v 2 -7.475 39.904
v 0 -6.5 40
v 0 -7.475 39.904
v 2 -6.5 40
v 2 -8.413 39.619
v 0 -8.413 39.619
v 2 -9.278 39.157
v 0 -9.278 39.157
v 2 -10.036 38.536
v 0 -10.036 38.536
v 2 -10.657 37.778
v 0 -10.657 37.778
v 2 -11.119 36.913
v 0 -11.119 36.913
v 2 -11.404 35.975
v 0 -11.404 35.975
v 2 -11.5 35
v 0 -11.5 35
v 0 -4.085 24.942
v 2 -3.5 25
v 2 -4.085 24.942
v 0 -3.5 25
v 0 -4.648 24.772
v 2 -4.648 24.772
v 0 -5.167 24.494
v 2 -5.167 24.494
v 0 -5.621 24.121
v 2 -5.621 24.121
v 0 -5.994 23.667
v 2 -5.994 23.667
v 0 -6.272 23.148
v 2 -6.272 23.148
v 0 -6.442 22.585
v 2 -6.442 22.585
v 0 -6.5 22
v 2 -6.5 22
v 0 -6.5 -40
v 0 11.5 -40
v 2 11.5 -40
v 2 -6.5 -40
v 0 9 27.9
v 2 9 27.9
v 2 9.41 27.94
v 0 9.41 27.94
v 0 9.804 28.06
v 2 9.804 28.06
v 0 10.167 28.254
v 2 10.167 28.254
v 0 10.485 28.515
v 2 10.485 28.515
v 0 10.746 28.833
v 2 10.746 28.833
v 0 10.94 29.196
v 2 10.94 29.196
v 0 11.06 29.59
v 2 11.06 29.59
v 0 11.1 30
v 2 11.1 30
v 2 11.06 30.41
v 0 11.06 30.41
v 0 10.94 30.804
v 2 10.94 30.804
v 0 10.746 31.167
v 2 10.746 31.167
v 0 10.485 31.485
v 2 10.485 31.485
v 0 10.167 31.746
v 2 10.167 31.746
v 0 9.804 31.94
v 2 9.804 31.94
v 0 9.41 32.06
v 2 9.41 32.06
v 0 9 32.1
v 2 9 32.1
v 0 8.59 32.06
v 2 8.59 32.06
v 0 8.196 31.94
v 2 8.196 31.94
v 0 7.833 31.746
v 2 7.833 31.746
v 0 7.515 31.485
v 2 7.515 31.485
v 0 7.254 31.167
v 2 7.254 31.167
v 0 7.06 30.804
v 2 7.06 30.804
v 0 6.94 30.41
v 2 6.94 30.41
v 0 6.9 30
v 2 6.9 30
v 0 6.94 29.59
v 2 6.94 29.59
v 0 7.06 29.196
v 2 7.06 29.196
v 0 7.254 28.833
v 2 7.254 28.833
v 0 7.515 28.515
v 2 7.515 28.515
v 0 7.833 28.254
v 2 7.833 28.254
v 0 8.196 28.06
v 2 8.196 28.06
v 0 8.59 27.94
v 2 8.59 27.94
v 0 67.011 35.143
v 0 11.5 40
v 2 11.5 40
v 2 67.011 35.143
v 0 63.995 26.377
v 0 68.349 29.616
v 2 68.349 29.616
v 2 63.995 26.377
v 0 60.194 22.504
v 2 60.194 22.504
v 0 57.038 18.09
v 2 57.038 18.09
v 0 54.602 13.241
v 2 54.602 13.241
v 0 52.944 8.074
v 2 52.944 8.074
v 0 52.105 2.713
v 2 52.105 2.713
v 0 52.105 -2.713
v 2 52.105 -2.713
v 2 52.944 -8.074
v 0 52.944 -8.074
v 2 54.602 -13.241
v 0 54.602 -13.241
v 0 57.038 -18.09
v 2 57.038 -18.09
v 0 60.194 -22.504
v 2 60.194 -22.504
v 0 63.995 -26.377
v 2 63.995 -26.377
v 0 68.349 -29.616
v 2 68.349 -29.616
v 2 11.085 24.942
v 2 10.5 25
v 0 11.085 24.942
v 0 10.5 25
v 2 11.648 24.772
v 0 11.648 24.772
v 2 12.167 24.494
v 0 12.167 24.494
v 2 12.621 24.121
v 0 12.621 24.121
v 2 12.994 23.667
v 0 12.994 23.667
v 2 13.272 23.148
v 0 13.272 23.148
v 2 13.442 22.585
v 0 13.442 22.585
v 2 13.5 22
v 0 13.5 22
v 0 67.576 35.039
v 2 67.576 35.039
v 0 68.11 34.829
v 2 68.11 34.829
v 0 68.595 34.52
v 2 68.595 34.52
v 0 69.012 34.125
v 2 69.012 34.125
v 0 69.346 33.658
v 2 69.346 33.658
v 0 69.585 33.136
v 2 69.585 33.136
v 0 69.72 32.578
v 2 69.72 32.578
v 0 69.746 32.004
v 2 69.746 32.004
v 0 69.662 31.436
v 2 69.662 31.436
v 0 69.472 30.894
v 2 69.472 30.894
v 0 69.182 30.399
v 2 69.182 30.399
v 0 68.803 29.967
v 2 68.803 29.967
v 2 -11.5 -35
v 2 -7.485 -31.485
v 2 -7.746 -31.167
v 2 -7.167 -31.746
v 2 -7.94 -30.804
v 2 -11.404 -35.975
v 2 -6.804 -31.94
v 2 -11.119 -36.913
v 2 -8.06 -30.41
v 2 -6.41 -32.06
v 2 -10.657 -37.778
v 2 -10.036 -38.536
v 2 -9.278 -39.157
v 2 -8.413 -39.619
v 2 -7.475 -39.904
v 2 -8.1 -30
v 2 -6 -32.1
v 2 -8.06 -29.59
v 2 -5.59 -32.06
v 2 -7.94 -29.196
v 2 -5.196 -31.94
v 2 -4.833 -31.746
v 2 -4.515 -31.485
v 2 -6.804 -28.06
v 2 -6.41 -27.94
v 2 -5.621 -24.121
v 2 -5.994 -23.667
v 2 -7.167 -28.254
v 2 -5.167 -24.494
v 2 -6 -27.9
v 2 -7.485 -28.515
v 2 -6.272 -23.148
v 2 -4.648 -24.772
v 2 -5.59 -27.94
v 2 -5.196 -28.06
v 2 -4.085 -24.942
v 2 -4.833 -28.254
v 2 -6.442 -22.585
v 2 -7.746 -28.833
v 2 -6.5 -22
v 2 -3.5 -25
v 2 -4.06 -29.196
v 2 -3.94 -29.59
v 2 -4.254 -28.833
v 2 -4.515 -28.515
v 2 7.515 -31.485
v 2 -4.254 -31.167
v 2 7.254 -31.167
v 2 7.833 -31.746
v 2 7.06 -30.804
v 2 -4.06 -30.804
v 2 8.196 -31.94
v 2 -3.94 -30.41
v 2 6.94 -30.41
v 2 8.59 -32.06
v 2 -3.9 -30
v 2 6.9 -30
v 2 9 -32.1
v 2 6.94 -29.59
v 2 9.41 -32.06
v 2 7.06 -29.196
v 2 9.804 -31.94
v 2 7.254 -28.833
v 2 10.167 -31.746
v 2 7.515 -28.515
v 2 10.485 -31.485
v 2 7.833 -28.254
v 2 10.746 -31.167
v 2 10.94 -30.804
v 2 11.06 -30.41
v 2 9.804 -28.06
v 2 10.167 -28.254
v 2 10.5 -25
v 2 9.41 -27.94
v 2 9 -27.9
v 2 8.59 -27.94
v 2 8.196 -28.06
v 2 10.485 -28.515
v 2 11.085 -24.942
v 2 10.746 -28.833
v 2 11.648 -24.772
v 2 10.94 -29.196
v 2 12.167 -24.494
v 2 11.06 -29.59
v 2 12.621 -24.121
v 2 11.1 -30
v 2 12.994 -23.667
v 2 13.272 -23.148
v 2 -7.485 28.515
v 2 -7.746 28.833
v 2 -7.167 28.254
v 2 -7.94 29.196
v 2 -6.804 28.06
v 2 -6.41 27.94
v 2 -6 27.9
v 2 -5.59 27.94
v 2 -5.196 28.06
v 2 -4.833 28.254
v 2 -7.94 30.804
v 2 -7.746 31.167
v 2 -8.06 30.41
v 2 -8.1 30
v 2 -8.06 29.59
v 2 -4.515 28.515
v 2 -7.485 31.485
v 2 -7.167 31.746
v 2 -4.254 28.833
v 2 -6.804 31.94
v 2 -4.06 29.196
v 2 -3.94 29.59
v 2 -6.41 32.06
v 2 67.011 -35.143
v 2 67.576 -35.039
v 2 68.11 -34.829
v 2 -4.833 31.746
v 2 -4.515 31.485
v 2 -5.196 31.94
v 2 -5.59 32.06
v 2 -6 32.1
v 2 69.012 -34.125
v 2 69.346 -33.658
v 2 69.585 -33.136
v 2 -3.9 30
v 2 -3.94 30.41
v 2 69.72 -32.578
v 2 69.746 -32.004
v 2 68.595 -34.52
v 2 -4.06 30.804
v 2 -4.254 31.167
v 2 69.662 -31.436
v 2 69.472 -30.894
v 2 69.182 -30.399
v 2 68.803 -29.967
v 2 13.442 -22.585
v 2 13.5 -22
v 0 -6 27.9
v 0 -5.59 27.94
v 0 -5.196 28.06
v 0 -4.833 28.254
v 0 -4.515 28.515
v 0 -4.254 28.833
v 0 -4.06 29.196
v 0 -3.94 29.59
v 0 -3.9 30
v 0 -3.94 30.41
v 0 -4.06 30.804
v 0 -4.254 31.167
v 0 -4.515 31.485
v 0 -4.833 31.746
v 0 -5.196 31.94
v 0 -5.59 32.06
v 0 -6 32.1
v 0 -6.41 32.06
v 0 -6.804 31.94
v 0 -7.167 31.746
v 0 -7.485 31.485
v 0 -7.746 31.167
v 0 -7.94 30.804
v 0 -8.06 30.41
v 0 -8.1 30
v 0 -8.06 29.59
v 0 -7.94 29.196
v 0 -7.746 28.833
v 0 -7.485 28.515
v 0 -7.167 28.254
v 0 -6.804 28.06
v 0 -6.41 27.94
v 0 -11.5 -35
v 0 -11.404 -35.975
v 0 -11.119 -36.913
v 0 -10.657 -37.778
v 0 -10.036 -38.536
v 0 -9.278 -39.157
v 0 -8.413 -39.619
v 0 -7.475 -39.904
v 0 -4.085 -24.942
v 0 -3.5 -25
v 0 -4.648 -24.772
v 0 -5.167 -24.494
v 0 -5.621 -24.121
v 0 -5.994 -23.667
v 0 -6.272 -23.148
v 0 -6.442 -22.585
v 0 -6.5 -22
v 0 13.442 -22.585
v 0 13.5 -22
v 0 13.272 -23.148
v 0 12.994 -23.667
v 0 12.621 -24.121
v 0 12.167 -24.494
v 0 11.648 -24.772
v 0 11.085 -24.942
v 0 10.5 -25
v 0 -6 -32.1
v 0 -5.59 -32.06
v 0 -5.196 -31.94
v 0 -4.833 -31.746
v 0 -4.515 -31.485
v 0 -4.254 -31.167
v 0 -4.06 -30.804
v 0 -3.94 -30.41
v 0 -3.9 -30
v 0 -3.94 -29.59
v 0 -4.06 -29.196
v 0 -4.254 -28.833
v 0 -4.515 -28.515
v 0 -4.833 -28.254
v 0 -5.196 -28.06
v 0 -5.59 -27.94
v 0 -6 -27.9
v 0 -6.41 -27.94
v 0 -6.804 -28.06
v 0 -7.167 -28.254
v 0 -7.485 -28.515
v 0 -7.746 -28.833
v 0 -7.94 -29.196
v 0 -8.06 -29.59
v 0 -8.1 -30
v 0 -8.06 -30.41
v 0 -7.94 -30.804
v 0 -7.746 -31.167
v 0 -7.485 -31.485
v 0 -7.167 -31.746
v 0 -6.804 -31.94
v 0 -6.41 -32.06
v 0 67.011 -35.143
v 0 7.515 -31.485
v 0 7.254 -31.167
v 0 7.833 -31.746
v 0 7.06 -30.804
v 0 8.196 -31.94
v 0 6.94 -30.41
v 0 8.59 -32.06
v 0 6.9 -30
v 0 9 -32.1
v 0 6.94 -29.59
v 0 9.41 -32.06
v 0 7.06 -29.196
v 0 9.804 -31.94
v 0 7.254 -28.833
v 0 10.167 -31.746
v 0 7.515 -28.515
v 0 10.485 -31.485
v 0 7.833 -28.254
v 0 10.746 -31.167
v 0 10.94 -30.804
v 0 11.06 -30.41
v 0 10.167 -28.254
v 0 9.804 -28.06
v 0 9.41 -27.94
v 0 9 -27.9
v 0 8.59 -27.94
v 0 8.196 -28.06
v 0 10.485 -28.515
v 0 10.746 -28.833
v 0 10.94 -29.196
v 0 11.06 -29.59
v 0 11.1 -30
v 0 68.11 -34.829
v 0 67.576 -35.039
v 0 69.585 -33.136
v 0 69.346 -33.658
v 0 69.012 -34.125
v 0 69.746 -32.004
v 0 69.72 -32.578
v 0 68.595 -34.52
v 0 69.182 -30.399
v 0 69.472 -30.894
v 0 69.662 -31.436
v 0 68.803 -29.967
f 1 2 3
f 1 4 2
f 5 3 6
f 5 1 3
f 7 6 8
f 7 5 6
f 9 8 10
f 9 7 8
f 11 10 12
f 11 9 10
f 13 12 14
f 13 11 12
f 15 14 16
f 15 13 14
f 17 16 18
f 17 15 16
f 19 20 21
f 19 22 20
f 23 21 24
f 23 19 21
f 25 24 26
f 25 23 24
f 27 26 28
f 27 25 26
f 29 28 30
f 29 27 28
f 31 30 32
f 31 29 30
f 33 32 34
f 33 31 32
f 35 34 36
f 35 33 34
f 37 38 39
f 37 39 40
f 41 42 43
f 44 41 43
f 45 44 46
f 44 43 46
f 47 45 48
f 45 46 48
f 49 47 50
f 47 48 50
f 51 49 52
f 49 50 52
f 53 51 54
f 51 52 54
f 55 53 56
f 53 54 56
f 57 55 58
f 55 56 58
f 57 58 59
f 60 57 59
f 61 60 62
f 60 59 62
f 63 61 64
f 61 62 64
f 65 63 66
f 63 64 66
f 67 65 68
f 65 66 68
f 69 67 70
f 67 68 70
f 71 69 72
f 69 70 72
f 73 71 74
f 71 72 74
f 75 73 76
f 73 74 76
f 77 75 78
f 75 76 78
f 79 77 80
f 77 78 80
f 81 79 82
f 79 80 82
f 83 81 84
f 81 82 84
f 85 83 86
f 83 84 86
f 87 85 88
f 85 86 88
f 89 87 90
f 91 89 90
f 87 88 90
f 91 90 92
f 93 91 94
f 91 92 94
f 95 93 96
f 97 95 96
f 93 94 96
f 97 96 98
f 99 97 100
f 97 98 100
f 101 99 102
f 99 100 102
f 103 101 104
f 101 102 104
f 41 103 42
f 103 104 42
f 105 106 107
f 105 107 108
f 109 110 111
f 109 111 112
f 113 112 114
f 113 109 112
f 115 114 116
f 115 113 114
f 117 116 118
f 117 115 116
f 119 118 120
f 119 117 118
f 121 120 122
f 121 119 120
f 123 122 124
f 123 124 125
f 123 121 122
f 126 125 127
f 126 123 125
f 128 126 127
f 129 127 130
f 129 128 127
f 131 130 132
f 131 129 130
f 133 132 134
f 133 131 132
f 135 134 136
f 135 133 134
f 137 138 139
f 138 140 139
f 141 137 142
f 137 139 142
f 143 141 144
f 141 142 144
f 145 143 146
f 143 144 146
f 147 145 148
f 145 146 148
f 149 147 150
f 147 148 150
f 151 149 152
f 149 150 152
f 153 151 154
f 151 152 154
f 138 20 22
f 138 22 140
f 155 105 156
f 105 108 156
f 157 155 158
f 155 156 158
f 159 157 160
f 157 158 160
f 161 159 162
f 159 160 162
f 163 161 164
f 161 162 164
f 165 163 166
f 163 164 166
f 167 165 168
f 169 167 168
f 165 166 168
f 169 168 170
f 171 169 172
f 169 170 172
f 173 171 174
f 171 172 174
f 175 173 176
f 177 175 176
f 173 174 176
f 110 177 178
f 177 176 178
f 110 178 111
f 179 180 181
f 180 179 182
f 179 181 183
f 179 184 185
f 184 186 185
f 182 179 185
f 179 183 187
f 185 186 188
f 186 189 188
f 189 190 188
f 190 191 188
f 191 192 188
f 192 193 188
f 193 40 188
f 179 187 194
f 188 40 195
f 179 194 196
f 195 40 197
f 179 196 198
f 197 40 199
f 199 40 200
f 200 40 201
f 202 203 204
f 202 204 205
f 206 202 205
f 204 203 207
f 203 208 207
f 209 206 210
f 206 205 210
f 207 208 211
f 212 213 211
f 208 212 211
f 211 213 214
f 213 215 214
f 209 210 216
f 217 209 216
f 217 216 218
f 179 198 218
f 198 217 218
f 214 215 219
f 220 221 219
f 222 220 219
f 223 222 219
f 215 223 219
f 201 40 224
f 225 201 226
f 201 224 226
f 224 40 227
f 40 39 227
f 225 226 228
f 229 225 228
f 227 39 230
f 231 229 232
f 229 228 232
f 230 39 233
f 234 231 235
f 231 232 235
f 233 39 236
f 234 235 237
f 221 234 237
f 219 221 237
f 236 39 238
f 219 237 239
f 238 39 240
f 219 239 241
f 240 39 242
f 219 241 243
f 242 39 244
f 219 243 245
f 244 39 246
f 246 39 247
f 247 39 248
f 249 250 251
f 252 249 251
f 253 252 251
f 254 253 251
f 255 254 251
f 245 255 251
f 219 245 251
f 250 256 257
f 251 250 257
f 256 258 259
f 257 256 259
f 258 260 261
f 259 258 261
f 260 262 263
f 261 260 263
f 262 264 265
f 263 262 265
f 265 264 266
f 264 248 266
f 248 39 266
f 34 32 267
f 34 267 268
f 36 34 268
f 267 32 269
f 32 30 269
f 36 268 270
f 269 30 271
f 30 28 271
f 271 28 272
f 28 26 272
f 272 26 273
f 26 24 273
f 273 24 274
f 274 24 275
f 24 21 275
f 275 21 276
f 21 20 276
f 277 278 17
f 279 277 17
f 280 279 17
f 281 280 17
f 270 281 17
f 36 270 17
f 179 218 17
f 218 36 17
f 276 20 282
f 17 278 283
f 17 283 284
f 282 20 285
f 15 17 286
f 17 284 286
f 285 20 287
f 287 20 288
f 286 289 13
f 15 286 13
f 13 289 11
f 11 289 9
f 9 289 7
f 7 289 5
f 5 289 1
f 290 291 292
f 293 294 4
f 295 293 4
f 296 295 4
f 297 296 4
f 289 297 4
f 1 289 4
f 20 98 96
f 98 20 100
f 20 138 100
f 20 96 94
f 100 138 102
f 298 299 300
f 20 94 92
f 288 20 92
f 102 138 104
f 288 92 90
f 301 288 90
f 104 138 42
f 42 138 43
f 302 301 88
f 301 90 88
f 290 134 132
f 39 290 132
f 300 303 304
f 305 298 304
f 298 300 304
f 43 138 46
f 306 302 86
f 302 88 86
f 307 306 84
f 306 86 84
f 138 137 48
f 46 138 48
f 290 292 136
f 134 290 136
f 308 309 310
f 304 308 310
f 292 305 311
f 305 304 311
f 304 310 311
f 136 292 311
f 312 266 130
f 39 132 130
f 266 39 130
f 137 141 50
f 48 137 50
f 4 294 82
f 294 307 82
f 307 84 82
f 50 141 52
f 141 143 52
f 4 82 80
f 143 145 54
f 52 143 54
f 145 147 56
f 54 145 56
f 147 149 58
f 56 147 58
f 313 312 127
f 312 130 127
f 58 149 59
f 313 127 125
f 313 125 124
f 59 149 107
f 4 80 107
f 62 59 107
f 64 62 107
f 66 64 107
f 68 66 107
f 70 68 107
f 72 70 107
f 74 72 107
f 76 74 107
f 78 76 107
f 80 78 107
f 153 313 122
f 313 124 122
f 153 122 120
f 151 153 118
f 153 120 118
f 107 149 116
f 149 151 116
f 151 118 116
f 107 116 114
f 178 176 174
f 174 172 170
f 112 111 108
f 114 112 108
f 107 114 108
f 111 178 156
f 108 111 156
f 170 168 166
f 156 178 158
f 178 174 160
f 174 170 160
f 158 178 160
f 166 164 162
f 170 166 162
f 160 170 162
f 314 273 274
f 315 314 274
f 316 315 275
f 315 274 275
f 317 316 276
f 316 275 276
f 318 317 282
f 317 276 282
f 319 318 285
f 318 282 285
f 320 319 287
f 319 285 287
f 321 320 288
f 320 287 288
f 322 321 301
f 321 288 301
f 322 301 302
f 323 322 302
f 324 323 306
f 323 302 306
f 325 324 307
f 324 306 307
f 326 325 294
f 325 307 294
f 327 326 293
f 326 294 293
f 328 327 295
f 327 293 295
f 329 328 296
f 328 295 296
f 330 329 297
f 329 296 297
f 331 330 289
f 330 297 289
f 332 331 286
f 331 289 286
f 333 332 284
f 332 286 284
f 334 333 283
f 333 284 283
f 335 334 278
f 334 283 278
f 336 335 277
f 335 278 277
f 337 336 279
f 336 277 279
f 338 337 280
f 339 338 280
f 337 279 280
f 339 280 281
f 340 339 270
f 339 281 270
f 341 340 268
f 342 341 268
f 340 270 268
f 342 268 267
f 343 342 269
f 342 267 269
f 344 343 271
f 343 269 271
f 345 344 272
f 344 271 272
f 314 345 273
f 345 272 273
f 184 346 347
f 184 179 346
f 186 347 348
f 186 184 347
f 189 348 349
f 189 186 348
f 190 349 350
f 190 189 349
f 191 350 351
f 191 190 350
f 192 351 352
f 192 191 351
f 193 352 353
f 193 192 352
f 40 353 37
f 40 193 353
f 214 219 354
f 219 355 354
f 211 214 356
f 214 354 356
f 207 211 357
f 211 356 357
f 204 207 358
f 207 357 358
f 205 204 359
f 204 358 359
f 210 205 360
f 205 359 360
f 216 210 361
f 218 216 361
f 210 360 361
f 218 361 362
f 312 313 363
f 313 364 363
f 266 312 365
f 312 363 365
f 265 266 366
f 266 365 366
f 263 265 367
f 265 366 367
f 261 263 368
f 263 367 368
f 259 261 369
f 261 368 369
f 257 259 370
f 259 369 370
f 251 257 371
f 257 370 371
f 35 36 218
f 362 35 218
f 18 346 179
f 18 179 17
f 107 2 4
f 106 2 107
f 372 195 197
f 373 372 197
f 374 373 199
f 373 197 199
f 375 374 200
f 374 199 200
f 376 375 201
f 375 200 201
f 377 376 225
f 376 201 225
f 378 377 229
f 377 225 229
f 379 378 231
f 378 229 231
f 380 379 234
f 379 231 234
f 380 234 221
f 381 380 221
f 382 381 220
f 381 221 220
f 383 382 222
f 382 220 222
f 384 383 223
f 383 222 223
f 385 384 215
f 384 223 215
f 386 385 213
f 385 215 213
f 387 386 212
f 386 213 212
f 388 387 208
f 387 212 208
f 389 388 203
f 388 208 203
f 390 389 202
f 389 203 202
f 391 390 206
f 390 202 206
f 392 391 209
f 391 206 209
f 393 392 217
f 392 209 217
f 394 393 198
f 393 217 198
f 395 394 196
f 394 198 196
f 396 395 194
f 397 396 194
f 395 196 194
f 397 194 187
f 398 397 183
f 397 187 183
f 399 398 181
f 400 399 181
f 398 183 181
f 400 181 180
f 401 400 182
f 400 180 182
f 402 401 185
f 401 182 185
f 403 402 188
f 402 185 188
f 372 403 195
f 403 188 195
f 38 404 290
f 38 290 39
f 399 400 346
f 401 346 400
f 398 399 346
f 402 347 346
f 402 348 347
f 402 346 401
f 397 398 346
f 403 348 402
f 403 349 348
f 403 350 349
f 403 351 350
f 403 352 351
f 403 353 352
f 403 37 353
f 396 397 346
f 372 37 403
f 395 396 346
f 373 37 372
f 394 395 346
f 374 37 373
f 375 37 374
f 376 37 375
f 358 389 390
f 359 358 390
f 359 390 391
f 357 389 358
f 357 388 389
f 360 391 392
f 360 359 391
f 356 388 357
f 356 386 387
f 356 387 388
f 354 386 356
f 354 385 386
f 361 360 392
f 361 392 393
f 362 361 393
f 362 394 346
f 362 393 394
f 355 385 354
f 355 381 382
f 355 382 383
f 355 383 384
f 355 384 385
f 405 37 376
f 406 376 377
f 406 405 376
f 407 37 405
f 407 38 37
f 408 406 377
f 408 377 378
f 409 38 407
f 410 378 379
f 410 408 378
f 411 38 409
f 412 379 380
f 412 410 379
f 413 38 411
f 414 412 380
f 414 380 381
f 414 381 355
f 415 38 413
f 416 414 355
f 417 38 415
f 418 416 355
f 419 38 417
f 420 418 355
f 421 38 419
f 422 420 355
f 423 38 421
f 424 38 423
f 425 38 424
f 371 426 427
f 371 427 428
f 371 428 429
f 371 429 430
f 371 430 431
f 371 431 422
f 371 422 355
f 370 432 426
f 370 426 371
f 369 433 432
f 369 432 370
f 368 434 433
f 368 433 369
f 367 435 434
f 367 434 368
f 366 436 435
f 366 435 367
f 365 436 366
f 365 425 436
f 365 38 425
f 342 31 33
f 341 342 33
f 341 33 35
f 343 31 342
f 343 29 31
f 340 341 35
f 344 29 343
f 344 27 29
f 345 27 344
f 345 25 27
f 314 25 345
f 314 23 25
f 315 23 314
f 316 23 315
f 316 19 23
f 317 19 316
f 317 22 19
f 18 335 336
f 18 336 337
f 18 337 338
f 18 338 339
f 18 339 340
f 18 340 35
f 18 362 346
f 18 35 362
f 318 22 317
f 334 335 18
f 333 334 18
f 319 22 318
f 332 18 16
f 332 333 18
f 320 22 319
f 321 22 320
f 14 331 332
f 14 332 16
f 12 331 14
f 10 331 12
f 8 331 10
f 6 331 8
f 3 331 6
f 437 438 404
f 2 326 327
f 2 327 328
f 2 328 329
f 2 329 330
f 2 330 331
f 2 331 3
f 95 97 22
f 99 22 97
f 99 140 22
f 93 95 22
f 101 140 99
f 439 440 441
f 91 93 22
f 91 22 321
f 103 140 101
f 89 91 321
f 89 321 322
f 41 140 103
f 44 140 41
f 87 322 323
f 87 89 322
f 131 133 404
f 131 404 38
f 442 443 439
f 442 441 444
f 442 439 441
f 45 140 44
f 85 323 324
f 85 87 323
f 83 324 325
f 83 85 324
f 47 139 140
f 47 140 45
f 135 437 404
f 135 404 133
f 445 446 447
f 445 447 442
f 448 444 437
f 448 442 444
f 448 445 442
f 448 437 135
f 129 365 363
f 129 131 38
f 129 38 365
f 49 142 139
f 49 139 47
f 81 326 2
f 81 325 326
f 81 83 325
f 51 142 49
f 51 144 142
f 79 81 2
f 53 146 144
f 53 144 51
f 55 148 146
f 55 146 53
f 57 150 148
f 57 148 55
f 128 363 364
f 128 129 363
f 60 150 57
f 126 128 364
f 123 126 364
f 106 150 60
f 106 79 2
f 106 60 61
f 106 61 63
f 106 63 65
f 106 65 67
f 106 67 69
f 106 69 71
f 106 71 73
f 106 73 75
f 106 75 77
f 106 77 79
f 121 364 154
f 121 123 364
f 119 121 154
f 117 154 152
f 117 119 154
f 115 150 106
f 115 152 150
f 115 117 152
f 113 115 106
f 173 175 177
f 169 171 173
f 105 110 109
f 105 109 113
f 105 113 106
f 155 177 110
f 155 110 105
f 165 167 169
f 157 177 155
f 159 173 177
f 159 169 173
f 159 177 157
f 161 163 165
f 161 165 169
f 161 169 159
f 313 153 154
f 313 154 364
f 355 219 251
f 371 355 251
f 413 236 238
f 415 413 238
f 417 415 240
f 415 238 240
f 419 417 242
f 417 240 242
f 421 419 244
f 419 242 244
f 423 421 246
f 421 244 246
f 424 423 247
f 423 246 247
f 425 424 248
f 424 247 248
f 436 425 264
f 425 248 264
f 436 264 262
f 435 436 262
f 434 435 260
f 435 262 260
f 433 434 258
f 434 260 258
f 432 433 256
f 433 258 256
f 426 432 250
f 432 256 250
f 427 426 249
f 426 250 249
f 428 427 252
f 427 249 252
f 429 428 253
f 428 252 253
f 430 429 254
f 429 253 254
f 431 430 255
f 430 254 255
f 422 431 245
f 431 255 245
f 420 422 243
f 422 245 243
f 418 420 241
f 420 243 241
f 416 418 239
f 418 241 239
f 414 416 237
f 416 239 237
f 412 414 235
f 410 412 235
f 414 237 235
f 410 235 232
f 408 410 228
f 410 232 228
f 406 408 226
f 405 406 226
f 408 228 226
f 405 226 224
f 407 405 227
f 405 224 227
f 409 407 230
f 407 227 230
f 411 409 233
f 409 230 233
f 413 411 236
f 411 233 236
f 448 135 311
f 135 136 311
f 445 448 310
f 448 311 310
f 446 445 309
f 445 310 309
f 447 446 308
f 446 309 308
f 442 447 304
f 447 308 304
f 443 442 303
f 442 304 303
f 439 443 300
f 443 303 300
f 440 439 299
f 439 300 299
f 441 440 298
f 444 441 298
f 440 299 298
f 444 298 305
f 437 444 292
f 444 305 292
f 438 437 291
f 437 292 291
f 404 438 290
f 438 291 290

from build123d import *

# Parameters (mm, degrees)
EXTRUDE_1_DEPTH     = 2
SKETCH_2_R          = 2.1
SKETCH_2_W          = 50
SKETCH_2_H          = 20
CUT_EXTRUDE_1_DEPTH = 2
FILLET_1_R          = 3
FILLET_2_R          = 5


with BuildPart() as part:
    # 草图1 → 凸台-拉伸1 (new body)
    with BuildSketch(Plane(origin=(0, 0, 0), x_dir=(0, 0, -1), z_dir=(1, 0, 0))):
        with BuildLine():
            Line((-40, 11.5), (-34.088778562, 79.065570207))
            ThreePointArc((-34.088778562, 79.065570207), (0, 52), (34.088778562, 79.065570207))
            Line((34.088778562, 79.065570207), (40, 11.5))
            Line((40, 11.5), (40, -11.5))
            Line((40, -11.5), (-40, -11.5))
            Line((-40, -11.5), (-40, 11.5))
        make_face()
    extrude(amount=EXTRUDE_1_DEPTH)

    # 草图2 → 切除-拉伸1 (cut)
    with BuildSketch(Plane(origin=(2, 0, 0), x_dir=(0, 0, -1), z_dir=(1, 0, 0))):
        with Locations((-30, 9)):
            Circle(SKETCH_2_R)
        with Locations((-30, -6)):
            Circle(SKETCH_2_R)
        with Locations((30, -6)):
            Circle(SKETCH_2_R)
        with Locations((30, 9)):
            Circle(SKETCH_2_R)
        with Locations((0, 3.5)):
            Rectangle(SKETCH_2_W, SKETCH_2_H)
    extrude(amount=-CUT_EXTRUDE_1_DEPTH, mode=Mode.SUBTRACT)

    # 圆角1
    fillet_1_edges = [part.edges().sort_by_distance(p)[0] for p in [
        (1, 79.065570207, 34.088778562),
        (1, 79.065570207, -34.088778562),
        (1, 13.5, -25),
        (1, -6.5, -25),
        (1, -6.5, 25),
        (1, 13.5, 25),
    ]]
    fillet(fillet_1_edges, radius=FILLET_1_R)

    # 圆角2
    fillet_2_edges = [part.edges().sort_by_distance(p)[0] for p in [
        (1, -11.5, -40),
        (1, -11.5, 40),
    ]]
    fillet(fillet_2_edges, radius=FILLET_2_R)


solid = part.part
